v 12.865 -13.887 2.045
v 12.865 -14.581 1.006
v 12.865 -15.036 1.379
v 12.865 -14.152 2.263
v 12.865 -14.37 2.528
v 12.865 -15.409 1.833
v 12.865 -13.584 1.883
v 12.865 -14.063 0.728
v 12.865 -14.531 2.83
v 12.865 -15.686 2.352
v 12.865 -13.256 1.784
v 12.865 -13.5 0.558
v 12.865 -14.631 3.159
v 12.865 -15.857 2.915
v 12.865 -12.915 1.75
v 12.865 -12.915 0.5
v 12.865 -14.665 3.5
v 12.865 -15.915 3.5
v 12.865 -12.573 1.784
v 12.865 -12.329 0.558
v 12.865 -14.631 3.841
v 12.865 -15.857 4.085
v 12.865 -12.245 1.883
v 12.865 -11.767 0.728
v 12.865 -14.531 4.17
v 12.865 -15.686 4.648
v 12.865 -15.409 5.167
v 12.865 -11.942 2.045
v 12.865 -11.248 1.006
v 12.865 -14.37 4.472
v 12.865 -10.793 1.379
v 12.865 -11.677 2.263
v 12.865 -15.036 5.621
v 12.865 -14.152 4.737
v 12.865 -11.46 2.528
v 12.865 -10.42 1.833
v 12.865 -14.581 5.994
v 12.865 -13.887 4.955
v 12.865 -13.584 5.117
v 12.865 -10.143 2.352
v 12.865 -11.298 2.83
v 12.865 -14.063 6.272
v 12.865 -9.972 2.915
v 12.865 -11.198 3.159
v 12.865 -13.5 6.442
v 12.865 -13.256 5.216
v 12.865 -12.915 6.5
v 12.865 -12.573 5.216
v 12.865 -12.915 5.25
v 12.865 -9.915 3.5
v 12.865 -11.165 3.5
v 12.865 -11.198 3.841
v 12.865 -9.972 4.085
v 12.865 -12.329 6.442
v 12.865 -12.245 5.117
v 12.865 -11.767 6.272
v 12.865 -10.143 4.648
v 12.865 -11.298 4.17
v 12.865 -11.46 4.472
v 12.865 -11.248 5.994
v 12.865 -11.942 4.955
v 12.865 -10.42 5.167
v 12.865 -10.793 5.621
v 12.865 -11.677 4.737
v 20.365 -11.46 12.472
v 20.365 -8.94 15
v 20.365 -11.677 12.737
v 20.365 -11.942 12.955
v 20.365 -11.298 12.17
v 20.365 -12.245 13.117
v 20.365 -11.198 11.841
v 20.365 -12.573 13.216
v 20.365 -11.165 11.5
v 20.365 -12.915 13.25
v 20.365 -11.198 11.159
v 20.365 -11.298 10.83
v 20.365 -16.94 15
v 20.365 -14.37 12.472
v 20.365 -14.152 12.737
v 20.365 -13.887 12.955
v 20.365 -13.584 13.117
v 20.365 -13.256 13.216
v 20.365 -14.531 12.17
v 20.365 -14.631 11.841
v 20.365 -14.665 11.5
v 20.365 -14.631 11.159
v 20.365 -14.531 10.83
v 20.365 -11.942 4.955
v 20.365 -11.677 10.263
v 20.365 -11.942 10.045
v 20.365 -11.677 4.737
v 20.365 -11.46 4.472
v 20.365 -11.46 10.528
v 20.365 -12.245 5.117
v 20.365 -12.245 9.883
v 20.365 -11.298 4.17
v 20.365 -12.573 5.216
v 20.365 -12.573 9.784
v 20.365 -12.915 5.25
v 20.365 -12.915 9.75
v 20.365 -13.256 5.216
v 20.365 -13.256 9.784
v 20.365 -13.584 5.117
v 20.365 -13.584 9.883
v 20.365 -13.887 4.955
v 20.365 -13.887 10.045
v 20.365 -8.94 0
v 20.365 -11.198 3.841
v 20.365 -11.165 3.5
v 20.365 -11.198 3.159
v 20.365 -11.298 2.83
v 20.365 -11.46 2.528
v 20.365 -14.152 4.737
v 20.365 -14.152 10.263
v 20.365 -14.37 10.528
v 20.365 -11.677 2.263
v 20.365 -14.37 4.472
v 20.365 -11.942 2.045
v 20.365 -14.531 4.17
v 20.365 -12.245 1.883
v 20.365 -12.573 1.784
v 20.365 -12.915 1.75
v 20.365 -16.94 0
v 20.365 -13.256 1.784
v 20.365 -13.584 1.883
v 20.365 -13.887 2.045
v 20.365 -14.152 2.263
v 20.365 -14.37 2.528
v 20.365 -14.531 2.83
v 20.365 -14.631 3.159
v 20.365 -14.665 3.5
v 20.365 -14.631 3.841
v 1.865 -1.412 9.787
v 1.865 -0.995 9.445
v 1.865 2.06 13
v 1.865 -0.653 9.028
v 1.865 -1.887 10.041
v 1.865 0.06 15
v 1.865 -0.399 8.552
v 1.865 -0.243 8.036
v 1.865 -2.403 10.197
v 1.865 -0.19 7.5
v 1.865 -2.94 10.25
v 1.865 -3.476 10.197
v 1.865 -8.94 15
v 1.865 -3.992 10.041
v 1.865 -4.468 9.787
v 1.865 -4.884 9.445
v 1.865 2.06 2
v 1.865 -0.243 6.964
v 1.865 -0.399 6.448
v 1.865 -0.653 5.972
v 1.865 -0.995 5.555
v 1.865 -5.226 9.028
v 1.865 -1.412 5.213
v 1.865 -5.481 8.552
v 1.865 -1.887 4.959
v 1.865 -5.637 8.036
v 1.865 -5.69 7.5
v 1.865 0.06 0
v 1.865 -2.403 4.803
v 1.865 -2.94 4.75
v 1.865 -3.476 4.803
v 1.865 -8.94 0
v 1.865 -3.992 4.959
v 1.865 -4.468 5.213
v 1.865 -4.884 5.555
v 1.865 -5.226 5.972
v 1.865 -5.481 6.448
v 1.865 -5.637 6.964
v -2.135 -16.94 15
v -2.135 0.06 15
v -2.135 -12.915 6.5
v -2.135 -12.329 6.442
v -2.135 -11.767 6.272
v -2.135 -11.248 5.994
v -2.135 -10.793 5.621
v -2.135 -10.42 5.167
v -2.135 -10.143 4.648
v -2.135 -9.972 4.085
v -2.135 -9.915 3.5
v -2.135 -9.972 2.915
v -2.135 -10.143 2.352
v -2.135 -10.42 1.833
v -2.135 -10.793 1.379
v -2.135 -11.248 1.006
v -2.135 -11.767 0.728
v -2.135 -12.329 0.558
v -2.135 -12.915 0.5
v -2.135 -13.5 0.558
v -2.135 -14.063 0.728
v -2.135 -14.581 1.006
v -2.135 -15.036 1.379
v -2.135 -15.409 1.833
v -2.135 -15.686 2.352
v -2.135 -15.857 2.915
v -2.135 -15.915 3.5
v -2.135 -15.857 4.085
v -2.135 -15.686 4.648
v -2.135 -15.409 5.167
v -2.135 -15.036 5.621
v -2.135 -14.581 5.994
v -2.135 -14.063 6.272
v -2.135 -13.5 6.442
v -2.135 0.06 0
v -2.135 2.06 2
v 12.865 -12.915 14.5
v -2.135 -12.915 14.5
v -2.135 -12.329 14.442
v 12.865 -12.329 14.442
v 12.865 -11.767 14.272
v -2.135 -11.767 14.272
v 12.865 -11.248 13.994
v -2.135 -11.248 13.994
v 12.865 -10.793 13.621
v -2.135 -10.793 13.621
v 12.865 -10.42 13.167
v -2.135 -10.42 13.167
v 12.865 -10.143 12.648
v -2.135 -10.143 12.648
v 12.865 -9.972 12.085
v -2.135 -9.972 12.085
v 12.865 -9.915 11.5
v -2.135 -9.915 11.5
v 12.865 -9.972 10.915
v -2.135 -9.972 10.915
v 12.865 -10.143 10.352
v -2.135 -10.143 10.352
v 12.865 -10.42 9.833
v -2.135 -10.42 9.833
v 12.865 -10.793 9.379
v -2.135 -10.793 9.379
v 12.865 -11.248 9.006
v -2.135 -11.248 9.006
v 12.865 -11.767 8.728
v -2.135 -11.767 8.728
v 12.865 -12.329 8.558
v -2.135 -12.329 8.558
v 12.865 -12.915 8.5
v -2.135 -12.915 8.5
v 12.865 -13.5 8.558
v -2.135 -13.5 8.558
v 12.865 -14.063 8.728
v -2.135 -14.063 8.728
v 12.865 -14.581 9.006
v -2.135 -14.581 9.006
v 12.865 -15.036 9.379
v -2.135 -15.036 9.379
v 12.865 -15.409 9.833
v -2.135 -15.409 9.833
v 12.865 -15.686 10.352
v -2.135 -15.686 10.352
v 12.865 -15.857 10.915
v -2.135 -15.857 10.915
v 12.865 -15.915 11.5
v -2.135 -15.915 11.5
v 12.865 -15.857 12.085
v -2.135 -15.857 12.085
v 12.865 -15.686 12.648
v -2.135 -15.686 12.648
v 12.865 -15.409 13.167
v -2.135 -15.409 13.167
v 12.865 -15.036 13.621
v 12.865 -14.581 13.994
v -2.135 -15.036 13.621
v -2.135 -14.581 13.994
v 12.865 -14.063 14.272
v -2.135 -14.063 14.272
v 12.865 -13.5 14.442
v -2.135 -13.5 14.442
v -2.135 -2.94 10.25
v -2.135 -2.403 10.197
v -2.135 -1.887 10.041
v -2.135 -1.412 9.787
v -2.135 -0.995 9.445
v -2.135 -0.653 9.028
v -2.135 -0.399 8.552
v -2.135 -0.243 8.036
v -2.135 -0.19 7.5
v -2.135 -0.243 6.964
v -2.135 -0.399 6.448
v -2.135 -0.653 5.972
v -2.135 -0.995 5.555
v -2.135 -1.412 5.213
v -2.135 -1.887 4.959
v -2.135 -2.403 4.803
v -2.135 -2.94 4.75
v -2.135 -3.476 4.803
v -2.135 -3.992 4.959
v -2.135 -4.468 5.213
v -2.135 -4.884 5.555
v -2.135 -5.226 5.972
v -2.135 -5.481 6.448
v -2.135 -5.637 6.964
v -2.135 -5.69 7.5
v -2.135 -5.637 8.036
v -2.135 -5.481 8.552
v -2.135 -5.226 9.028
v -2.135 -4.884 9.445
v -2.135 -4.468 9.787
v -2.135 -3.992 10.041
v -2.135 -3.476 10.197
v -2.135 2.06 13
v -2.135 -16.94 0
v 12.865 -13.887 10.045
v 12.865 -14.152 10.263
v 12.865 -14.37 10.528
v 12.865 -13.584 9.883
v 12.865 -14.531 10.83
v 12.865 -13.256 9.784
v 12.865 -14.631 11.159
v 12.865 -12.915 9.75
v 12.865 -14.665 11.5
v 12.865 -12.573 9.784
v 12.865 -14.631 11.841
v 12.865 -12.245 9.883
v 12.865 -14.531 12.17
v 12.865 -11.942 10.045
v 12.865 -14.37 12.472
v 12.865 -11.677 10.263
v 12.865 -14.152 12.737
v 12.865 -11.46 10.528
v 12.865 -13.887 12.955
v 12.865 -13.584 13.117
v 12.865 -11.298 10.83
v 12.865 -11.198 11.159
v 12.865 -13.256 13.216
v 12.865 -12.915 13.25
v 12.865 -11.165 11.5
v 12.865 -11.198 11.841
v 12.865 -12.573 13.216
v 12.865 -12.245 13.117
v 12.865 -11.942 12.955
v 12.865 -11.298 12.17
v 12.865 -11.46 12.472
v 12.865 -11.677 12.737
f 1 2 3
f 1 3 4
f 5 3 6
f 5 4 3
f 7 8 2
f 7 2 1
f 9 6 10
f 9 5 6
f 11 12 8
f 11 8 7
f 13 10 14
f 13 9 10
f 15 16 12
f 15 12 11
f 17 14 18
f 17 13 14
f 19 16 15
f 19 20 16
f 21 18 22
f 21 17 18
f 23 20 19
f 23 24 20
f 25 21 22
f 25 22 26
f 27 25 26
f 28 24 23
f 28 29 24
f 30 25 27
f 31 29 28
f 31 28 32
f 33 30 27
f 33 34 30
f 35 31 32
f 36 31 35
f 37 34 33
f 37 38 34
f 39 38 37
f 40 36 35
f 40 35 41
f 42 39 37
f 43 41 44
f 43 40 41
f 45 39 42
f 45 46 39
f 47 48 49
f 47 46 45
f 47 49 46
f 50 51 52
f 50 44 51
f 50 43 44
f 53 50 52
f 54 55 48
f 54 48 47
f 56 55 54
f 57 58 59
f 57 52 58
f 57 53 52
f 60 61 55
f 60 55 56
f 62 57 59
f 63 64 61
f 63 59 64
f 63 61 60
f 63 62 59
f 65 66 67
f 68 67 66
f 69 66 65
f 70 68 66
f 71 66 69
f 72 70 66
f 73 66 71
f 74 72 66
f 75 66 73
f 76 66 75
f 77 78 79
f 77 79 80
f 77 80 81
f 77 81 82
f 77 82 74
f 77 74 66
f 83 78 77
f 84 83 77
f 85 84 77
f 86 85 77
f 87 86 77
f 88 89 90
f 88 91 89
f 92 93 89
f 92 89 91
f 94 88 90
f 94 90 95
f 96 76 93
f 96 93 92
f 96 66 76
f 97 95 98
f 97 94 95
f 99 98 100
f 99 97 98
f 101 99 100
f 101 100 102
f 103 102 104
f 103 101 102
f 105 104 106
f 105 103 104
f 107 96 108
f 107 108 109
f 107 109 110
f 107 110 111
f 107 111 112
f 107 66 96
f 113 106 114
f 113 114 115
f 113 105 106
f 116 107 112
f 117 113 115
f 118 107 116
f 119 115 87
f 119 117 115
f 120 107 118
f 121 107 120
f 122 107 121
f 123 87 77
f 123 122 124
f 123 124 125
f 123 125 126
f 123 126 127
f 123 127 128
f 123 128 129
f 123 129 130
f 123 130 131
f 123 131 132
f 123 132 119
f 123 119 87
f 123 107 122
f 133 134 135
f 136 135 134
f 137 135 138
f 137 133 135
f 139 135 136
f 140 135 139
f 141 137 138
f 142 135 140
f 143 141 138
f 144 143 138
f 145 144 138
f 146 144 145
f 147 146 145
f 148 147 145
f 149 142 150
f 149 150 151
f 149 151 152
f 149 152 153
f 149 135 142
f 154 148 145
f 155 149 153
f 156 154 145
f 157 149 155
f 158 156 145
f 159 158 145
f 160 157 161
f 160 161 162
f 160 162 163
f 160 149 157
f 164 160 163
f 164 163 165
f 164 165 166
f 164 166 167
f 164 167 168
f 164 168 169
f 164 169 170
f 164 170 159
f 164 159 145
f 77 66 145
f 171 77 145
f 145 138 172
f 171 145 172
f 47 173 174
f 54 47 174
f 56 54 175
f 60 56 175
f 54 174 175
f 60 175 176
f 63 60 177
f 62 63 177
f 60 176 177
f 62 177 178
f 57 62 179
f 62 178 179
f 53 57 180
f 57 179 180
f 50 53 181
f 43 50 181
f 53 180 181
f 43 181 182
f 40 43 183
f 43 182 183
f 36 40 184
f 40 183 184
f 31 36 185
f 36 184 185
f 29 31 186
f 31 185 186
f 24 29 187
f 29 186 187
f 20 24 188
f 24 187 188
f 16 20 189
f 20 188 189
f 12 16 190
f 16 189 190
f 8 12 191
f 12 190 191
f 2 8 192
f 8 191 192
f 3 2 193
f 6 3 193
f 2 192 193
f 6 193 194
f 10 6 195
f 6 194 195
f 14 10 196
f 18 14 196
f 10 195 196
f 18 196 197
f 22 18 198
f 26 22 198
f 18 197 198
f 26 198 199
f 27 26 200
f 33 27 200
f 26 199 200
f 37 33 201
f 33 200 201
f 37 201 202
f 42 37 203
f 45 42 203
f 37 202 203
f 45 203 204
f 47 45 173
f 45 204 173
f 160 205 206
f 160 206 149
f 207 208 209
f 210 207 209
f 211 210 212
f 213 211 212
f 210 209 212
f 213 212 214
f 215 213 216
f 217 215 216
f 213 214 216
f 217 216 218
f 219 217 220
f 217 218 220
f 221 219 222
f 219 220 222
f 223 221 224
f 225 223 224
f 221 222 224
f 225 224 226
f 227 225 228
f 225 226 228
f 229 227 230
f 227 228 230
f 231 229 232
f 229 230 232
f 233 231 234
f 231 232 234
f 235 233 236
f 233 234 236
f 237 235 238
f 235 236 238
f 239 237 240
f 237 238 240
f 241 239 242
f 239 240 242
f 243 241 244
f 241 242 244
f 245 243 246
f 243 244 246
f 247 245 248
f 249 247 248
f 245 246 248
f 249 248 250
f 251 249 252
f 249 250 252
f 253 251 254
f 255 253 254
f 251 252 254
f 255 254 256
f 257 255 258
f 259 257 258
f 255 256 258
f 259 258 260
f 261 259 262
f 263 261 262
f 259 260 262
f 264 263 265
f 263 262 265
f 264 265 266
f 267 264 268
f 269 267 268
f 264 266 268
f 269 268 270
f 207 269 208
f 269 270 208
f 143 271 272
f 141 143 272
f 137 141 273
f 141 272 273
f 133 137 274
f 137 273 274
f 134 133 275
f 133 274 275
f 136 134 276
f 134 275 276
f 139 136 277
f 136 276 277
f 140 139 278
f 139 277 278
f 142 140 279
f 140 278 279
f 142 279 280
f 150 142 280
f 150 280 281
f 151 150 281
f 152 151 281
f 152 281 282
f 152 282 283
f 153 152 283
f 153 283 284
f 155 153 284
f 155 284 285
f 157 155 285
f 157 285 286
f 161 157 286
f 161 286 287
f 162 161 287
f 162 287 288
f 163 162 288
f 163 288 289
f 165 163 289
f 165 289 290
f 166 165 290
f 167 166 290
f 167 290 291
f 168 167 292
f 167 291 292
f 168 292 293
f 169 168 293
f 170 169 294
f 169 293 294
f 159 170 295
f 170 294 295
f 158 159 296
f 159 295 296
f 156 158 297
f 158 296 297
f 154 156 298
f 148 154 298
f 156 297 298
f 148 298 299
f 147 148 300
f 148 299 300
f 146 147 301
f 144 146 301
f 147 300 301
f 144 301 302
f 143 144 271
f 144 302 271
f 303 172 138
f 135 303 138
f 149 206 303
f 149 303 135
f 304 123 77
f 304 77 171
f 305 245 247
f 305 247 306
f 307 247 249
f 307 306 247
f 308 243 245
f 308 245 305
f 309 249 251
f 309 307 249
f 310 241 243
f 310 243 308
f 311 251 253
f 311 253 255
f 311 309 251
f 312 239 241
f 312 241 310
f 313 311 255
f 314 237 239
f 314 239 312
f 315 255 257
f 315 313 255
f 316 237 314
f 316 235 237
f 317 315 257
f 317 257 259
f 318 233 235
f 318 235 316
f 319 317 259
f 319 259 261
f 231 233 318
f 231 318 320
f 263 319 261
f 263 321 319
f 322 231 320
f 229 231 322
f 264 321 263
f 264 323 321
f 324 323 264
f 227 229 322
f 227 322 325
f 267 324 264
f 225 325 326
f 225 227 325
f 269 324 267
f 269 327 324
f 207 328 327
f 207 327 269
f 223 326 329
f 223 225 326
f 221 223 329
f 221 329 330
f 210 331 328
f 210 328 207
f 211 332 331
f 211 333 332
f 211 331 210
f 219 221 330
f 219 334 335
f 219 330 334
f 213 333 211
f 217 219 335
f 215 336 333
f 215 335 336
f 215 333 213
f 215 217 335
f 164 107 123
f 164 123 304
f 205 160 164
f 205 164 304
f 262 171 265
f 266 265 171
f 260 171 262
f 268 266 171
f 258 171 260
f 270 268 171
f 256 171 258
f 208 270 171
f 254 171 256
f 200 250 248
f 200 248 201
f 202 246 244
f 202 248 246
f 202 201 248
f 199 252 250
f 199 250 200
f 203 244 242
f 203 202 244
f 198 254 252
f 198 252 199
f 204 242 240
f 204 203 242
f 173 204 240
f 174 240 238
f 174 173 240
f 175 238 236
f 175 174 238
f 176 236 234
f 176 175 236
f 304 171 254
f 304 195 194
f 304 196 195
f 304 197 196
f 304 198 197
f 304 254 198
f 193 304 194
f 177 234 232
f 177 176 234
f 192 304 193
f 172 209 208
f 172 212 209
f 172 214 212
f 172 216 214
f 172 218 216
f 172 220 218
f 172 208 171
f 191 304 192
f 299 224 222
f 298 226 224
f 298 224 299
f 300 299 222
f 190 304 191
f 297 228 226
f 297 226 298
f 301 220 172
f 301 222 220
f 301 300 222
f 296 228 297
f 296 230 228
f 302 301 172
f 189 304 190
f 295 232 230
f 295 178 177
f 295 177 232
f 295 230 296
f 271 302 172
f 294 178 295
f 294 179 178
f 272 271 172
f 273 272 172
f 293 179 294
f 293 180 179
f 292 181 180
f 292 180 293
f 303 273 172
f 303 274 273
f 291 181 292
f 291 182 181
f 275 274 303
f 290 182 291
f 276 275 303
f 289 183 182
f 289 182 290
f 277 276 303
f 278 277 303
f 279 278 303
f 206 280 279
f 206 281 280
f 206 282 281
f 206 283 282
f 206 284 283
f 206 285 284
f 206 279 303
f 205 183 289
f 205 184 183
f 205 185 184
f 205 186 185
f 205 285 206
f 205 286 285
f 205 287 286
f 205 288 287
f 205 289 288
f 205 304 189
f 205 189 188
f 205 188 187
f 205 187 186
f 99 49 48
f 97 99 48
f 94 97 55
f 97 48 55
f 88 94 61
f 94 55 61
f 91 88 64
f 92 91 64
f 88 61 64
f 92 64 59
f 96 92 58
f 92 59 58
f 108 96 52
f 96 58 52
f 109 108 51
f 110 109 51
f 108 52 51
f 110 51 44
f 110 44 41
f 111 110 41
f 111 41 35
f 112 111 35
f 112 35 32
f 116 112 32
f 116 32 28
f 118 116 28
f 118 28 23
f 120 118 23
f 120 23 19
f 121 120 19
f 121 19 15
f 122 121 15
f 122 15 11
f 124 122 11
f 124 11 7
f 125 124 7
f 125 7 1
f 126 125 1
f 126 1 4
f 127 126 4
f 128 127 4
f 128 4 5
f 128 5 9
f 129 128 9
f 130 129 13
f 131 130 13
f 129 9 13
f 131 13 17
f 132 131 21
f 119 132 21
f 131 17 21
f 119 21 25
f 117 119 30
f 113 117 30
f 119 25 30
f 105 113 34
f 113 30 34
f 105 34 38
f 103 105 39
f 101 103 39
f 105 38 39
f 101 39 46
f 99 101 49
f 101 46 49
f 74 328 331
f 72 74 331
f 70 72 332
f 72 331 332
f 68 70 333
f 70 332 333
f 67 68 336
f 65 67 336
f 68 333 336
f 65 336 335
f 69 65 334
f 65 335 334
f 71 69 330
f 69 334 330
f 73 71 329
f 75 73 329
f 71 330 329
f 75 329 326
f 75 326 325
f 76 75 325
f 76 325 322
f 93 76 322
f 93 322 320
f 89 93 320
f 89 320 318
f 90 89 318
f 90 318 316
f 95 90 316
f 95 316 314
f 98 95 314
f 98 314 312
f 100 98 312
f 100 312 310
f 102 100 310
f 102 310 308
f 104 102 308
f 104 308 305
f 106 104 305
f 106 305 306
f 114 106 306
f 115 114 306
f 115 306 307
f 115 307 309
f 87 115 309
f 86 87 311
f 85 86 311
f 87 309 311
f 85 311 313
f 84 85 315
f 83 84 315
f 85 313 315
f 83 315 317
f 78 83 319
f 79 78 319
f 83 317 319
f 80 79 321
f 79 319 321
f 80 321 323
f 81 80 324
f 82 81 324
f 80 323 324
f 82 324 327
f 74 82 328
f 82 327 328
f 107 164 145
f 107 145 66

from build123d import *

# Parameters (mm, degrees)
BOSS_EXTRUDE1_DEPTH = 15
SKETCH2_R           = 2.75
SKETCH2_R_2         = 3
SKETCH2_R_3         = 1.75
CUT_EXTRUDE1_DEPTH  = 15
SKETCH3_R           = 1.75
CUT_EXTRUDE2_DEPTH  = 23.5
CHAMFER1_SIZE       = 2


with BuildPart() as part:
    # Sketch1 → Boss-Extrude1 (new body)
    with BuildSketch(Plane.XY):
        Polygon((-2.135338346, 2.060150376), (1.864661654, 2.060150376), (1.864661654, -8.939849624), (20.364661654, -8.939849624), (20.364661654, -16.939849624), (-2.135338346, -16.939849624), align=None)
    extrude(amount=BOSS_EXTRUDE1_DEPTH)

    # Sketch2 → Cut-Extrude1 (cut)
    with BuildSketch(Plane.ZY.offset(2.135338346)):
        with Locations((7.5, -2.939849624)):
            Circle(SKETCH2_R)
        with Locations((11.5, -12.914706032)):
            Circle(SKETCH2_R_2)
        with Locations((11.5, -12.914706032)):
            Circle(SKETCH2_R_3, mode=Mode.SUBTRACT)
        with Locations((3.5, -12.914706032)):
            Circle(SKETCH2_R_2)
        with Locations((3.5, -12.914706032)):
            Circle(SKETCH2_R_3, mode=Mode.SUBTRACT)
    extrude(amount=-CUT_EXTRUDE1_DEPTH, mode=Mode.SUBTRACT)

    # Sketch3 → Cut-Extrude2 (cut, through all)
    with BuildSketch(Plane.ZY.offset(2.135338346)):
        with Locations((3.5, -12.914706032)):
            Circle(SKETCH3_R)
        with Locations((11.5, -12.914706032)):
            Circle(SKETCH3_R)
    extrude(amount=-CUT_EXTRUDE2_DEPTH, mode=Mode.SUBTRACT)

    # Chamfer1
    chamfer1_edges = [part.edges().sort_by_distance(p)[0] for p in [
        (-0.135338346, 2.060150376, 15),
        (-0.135338346, 2.060150376, 0),
    ]]
    chamfer(chamfer1_edges, length=CHAMFER1_SIZE)


solid = part.part
